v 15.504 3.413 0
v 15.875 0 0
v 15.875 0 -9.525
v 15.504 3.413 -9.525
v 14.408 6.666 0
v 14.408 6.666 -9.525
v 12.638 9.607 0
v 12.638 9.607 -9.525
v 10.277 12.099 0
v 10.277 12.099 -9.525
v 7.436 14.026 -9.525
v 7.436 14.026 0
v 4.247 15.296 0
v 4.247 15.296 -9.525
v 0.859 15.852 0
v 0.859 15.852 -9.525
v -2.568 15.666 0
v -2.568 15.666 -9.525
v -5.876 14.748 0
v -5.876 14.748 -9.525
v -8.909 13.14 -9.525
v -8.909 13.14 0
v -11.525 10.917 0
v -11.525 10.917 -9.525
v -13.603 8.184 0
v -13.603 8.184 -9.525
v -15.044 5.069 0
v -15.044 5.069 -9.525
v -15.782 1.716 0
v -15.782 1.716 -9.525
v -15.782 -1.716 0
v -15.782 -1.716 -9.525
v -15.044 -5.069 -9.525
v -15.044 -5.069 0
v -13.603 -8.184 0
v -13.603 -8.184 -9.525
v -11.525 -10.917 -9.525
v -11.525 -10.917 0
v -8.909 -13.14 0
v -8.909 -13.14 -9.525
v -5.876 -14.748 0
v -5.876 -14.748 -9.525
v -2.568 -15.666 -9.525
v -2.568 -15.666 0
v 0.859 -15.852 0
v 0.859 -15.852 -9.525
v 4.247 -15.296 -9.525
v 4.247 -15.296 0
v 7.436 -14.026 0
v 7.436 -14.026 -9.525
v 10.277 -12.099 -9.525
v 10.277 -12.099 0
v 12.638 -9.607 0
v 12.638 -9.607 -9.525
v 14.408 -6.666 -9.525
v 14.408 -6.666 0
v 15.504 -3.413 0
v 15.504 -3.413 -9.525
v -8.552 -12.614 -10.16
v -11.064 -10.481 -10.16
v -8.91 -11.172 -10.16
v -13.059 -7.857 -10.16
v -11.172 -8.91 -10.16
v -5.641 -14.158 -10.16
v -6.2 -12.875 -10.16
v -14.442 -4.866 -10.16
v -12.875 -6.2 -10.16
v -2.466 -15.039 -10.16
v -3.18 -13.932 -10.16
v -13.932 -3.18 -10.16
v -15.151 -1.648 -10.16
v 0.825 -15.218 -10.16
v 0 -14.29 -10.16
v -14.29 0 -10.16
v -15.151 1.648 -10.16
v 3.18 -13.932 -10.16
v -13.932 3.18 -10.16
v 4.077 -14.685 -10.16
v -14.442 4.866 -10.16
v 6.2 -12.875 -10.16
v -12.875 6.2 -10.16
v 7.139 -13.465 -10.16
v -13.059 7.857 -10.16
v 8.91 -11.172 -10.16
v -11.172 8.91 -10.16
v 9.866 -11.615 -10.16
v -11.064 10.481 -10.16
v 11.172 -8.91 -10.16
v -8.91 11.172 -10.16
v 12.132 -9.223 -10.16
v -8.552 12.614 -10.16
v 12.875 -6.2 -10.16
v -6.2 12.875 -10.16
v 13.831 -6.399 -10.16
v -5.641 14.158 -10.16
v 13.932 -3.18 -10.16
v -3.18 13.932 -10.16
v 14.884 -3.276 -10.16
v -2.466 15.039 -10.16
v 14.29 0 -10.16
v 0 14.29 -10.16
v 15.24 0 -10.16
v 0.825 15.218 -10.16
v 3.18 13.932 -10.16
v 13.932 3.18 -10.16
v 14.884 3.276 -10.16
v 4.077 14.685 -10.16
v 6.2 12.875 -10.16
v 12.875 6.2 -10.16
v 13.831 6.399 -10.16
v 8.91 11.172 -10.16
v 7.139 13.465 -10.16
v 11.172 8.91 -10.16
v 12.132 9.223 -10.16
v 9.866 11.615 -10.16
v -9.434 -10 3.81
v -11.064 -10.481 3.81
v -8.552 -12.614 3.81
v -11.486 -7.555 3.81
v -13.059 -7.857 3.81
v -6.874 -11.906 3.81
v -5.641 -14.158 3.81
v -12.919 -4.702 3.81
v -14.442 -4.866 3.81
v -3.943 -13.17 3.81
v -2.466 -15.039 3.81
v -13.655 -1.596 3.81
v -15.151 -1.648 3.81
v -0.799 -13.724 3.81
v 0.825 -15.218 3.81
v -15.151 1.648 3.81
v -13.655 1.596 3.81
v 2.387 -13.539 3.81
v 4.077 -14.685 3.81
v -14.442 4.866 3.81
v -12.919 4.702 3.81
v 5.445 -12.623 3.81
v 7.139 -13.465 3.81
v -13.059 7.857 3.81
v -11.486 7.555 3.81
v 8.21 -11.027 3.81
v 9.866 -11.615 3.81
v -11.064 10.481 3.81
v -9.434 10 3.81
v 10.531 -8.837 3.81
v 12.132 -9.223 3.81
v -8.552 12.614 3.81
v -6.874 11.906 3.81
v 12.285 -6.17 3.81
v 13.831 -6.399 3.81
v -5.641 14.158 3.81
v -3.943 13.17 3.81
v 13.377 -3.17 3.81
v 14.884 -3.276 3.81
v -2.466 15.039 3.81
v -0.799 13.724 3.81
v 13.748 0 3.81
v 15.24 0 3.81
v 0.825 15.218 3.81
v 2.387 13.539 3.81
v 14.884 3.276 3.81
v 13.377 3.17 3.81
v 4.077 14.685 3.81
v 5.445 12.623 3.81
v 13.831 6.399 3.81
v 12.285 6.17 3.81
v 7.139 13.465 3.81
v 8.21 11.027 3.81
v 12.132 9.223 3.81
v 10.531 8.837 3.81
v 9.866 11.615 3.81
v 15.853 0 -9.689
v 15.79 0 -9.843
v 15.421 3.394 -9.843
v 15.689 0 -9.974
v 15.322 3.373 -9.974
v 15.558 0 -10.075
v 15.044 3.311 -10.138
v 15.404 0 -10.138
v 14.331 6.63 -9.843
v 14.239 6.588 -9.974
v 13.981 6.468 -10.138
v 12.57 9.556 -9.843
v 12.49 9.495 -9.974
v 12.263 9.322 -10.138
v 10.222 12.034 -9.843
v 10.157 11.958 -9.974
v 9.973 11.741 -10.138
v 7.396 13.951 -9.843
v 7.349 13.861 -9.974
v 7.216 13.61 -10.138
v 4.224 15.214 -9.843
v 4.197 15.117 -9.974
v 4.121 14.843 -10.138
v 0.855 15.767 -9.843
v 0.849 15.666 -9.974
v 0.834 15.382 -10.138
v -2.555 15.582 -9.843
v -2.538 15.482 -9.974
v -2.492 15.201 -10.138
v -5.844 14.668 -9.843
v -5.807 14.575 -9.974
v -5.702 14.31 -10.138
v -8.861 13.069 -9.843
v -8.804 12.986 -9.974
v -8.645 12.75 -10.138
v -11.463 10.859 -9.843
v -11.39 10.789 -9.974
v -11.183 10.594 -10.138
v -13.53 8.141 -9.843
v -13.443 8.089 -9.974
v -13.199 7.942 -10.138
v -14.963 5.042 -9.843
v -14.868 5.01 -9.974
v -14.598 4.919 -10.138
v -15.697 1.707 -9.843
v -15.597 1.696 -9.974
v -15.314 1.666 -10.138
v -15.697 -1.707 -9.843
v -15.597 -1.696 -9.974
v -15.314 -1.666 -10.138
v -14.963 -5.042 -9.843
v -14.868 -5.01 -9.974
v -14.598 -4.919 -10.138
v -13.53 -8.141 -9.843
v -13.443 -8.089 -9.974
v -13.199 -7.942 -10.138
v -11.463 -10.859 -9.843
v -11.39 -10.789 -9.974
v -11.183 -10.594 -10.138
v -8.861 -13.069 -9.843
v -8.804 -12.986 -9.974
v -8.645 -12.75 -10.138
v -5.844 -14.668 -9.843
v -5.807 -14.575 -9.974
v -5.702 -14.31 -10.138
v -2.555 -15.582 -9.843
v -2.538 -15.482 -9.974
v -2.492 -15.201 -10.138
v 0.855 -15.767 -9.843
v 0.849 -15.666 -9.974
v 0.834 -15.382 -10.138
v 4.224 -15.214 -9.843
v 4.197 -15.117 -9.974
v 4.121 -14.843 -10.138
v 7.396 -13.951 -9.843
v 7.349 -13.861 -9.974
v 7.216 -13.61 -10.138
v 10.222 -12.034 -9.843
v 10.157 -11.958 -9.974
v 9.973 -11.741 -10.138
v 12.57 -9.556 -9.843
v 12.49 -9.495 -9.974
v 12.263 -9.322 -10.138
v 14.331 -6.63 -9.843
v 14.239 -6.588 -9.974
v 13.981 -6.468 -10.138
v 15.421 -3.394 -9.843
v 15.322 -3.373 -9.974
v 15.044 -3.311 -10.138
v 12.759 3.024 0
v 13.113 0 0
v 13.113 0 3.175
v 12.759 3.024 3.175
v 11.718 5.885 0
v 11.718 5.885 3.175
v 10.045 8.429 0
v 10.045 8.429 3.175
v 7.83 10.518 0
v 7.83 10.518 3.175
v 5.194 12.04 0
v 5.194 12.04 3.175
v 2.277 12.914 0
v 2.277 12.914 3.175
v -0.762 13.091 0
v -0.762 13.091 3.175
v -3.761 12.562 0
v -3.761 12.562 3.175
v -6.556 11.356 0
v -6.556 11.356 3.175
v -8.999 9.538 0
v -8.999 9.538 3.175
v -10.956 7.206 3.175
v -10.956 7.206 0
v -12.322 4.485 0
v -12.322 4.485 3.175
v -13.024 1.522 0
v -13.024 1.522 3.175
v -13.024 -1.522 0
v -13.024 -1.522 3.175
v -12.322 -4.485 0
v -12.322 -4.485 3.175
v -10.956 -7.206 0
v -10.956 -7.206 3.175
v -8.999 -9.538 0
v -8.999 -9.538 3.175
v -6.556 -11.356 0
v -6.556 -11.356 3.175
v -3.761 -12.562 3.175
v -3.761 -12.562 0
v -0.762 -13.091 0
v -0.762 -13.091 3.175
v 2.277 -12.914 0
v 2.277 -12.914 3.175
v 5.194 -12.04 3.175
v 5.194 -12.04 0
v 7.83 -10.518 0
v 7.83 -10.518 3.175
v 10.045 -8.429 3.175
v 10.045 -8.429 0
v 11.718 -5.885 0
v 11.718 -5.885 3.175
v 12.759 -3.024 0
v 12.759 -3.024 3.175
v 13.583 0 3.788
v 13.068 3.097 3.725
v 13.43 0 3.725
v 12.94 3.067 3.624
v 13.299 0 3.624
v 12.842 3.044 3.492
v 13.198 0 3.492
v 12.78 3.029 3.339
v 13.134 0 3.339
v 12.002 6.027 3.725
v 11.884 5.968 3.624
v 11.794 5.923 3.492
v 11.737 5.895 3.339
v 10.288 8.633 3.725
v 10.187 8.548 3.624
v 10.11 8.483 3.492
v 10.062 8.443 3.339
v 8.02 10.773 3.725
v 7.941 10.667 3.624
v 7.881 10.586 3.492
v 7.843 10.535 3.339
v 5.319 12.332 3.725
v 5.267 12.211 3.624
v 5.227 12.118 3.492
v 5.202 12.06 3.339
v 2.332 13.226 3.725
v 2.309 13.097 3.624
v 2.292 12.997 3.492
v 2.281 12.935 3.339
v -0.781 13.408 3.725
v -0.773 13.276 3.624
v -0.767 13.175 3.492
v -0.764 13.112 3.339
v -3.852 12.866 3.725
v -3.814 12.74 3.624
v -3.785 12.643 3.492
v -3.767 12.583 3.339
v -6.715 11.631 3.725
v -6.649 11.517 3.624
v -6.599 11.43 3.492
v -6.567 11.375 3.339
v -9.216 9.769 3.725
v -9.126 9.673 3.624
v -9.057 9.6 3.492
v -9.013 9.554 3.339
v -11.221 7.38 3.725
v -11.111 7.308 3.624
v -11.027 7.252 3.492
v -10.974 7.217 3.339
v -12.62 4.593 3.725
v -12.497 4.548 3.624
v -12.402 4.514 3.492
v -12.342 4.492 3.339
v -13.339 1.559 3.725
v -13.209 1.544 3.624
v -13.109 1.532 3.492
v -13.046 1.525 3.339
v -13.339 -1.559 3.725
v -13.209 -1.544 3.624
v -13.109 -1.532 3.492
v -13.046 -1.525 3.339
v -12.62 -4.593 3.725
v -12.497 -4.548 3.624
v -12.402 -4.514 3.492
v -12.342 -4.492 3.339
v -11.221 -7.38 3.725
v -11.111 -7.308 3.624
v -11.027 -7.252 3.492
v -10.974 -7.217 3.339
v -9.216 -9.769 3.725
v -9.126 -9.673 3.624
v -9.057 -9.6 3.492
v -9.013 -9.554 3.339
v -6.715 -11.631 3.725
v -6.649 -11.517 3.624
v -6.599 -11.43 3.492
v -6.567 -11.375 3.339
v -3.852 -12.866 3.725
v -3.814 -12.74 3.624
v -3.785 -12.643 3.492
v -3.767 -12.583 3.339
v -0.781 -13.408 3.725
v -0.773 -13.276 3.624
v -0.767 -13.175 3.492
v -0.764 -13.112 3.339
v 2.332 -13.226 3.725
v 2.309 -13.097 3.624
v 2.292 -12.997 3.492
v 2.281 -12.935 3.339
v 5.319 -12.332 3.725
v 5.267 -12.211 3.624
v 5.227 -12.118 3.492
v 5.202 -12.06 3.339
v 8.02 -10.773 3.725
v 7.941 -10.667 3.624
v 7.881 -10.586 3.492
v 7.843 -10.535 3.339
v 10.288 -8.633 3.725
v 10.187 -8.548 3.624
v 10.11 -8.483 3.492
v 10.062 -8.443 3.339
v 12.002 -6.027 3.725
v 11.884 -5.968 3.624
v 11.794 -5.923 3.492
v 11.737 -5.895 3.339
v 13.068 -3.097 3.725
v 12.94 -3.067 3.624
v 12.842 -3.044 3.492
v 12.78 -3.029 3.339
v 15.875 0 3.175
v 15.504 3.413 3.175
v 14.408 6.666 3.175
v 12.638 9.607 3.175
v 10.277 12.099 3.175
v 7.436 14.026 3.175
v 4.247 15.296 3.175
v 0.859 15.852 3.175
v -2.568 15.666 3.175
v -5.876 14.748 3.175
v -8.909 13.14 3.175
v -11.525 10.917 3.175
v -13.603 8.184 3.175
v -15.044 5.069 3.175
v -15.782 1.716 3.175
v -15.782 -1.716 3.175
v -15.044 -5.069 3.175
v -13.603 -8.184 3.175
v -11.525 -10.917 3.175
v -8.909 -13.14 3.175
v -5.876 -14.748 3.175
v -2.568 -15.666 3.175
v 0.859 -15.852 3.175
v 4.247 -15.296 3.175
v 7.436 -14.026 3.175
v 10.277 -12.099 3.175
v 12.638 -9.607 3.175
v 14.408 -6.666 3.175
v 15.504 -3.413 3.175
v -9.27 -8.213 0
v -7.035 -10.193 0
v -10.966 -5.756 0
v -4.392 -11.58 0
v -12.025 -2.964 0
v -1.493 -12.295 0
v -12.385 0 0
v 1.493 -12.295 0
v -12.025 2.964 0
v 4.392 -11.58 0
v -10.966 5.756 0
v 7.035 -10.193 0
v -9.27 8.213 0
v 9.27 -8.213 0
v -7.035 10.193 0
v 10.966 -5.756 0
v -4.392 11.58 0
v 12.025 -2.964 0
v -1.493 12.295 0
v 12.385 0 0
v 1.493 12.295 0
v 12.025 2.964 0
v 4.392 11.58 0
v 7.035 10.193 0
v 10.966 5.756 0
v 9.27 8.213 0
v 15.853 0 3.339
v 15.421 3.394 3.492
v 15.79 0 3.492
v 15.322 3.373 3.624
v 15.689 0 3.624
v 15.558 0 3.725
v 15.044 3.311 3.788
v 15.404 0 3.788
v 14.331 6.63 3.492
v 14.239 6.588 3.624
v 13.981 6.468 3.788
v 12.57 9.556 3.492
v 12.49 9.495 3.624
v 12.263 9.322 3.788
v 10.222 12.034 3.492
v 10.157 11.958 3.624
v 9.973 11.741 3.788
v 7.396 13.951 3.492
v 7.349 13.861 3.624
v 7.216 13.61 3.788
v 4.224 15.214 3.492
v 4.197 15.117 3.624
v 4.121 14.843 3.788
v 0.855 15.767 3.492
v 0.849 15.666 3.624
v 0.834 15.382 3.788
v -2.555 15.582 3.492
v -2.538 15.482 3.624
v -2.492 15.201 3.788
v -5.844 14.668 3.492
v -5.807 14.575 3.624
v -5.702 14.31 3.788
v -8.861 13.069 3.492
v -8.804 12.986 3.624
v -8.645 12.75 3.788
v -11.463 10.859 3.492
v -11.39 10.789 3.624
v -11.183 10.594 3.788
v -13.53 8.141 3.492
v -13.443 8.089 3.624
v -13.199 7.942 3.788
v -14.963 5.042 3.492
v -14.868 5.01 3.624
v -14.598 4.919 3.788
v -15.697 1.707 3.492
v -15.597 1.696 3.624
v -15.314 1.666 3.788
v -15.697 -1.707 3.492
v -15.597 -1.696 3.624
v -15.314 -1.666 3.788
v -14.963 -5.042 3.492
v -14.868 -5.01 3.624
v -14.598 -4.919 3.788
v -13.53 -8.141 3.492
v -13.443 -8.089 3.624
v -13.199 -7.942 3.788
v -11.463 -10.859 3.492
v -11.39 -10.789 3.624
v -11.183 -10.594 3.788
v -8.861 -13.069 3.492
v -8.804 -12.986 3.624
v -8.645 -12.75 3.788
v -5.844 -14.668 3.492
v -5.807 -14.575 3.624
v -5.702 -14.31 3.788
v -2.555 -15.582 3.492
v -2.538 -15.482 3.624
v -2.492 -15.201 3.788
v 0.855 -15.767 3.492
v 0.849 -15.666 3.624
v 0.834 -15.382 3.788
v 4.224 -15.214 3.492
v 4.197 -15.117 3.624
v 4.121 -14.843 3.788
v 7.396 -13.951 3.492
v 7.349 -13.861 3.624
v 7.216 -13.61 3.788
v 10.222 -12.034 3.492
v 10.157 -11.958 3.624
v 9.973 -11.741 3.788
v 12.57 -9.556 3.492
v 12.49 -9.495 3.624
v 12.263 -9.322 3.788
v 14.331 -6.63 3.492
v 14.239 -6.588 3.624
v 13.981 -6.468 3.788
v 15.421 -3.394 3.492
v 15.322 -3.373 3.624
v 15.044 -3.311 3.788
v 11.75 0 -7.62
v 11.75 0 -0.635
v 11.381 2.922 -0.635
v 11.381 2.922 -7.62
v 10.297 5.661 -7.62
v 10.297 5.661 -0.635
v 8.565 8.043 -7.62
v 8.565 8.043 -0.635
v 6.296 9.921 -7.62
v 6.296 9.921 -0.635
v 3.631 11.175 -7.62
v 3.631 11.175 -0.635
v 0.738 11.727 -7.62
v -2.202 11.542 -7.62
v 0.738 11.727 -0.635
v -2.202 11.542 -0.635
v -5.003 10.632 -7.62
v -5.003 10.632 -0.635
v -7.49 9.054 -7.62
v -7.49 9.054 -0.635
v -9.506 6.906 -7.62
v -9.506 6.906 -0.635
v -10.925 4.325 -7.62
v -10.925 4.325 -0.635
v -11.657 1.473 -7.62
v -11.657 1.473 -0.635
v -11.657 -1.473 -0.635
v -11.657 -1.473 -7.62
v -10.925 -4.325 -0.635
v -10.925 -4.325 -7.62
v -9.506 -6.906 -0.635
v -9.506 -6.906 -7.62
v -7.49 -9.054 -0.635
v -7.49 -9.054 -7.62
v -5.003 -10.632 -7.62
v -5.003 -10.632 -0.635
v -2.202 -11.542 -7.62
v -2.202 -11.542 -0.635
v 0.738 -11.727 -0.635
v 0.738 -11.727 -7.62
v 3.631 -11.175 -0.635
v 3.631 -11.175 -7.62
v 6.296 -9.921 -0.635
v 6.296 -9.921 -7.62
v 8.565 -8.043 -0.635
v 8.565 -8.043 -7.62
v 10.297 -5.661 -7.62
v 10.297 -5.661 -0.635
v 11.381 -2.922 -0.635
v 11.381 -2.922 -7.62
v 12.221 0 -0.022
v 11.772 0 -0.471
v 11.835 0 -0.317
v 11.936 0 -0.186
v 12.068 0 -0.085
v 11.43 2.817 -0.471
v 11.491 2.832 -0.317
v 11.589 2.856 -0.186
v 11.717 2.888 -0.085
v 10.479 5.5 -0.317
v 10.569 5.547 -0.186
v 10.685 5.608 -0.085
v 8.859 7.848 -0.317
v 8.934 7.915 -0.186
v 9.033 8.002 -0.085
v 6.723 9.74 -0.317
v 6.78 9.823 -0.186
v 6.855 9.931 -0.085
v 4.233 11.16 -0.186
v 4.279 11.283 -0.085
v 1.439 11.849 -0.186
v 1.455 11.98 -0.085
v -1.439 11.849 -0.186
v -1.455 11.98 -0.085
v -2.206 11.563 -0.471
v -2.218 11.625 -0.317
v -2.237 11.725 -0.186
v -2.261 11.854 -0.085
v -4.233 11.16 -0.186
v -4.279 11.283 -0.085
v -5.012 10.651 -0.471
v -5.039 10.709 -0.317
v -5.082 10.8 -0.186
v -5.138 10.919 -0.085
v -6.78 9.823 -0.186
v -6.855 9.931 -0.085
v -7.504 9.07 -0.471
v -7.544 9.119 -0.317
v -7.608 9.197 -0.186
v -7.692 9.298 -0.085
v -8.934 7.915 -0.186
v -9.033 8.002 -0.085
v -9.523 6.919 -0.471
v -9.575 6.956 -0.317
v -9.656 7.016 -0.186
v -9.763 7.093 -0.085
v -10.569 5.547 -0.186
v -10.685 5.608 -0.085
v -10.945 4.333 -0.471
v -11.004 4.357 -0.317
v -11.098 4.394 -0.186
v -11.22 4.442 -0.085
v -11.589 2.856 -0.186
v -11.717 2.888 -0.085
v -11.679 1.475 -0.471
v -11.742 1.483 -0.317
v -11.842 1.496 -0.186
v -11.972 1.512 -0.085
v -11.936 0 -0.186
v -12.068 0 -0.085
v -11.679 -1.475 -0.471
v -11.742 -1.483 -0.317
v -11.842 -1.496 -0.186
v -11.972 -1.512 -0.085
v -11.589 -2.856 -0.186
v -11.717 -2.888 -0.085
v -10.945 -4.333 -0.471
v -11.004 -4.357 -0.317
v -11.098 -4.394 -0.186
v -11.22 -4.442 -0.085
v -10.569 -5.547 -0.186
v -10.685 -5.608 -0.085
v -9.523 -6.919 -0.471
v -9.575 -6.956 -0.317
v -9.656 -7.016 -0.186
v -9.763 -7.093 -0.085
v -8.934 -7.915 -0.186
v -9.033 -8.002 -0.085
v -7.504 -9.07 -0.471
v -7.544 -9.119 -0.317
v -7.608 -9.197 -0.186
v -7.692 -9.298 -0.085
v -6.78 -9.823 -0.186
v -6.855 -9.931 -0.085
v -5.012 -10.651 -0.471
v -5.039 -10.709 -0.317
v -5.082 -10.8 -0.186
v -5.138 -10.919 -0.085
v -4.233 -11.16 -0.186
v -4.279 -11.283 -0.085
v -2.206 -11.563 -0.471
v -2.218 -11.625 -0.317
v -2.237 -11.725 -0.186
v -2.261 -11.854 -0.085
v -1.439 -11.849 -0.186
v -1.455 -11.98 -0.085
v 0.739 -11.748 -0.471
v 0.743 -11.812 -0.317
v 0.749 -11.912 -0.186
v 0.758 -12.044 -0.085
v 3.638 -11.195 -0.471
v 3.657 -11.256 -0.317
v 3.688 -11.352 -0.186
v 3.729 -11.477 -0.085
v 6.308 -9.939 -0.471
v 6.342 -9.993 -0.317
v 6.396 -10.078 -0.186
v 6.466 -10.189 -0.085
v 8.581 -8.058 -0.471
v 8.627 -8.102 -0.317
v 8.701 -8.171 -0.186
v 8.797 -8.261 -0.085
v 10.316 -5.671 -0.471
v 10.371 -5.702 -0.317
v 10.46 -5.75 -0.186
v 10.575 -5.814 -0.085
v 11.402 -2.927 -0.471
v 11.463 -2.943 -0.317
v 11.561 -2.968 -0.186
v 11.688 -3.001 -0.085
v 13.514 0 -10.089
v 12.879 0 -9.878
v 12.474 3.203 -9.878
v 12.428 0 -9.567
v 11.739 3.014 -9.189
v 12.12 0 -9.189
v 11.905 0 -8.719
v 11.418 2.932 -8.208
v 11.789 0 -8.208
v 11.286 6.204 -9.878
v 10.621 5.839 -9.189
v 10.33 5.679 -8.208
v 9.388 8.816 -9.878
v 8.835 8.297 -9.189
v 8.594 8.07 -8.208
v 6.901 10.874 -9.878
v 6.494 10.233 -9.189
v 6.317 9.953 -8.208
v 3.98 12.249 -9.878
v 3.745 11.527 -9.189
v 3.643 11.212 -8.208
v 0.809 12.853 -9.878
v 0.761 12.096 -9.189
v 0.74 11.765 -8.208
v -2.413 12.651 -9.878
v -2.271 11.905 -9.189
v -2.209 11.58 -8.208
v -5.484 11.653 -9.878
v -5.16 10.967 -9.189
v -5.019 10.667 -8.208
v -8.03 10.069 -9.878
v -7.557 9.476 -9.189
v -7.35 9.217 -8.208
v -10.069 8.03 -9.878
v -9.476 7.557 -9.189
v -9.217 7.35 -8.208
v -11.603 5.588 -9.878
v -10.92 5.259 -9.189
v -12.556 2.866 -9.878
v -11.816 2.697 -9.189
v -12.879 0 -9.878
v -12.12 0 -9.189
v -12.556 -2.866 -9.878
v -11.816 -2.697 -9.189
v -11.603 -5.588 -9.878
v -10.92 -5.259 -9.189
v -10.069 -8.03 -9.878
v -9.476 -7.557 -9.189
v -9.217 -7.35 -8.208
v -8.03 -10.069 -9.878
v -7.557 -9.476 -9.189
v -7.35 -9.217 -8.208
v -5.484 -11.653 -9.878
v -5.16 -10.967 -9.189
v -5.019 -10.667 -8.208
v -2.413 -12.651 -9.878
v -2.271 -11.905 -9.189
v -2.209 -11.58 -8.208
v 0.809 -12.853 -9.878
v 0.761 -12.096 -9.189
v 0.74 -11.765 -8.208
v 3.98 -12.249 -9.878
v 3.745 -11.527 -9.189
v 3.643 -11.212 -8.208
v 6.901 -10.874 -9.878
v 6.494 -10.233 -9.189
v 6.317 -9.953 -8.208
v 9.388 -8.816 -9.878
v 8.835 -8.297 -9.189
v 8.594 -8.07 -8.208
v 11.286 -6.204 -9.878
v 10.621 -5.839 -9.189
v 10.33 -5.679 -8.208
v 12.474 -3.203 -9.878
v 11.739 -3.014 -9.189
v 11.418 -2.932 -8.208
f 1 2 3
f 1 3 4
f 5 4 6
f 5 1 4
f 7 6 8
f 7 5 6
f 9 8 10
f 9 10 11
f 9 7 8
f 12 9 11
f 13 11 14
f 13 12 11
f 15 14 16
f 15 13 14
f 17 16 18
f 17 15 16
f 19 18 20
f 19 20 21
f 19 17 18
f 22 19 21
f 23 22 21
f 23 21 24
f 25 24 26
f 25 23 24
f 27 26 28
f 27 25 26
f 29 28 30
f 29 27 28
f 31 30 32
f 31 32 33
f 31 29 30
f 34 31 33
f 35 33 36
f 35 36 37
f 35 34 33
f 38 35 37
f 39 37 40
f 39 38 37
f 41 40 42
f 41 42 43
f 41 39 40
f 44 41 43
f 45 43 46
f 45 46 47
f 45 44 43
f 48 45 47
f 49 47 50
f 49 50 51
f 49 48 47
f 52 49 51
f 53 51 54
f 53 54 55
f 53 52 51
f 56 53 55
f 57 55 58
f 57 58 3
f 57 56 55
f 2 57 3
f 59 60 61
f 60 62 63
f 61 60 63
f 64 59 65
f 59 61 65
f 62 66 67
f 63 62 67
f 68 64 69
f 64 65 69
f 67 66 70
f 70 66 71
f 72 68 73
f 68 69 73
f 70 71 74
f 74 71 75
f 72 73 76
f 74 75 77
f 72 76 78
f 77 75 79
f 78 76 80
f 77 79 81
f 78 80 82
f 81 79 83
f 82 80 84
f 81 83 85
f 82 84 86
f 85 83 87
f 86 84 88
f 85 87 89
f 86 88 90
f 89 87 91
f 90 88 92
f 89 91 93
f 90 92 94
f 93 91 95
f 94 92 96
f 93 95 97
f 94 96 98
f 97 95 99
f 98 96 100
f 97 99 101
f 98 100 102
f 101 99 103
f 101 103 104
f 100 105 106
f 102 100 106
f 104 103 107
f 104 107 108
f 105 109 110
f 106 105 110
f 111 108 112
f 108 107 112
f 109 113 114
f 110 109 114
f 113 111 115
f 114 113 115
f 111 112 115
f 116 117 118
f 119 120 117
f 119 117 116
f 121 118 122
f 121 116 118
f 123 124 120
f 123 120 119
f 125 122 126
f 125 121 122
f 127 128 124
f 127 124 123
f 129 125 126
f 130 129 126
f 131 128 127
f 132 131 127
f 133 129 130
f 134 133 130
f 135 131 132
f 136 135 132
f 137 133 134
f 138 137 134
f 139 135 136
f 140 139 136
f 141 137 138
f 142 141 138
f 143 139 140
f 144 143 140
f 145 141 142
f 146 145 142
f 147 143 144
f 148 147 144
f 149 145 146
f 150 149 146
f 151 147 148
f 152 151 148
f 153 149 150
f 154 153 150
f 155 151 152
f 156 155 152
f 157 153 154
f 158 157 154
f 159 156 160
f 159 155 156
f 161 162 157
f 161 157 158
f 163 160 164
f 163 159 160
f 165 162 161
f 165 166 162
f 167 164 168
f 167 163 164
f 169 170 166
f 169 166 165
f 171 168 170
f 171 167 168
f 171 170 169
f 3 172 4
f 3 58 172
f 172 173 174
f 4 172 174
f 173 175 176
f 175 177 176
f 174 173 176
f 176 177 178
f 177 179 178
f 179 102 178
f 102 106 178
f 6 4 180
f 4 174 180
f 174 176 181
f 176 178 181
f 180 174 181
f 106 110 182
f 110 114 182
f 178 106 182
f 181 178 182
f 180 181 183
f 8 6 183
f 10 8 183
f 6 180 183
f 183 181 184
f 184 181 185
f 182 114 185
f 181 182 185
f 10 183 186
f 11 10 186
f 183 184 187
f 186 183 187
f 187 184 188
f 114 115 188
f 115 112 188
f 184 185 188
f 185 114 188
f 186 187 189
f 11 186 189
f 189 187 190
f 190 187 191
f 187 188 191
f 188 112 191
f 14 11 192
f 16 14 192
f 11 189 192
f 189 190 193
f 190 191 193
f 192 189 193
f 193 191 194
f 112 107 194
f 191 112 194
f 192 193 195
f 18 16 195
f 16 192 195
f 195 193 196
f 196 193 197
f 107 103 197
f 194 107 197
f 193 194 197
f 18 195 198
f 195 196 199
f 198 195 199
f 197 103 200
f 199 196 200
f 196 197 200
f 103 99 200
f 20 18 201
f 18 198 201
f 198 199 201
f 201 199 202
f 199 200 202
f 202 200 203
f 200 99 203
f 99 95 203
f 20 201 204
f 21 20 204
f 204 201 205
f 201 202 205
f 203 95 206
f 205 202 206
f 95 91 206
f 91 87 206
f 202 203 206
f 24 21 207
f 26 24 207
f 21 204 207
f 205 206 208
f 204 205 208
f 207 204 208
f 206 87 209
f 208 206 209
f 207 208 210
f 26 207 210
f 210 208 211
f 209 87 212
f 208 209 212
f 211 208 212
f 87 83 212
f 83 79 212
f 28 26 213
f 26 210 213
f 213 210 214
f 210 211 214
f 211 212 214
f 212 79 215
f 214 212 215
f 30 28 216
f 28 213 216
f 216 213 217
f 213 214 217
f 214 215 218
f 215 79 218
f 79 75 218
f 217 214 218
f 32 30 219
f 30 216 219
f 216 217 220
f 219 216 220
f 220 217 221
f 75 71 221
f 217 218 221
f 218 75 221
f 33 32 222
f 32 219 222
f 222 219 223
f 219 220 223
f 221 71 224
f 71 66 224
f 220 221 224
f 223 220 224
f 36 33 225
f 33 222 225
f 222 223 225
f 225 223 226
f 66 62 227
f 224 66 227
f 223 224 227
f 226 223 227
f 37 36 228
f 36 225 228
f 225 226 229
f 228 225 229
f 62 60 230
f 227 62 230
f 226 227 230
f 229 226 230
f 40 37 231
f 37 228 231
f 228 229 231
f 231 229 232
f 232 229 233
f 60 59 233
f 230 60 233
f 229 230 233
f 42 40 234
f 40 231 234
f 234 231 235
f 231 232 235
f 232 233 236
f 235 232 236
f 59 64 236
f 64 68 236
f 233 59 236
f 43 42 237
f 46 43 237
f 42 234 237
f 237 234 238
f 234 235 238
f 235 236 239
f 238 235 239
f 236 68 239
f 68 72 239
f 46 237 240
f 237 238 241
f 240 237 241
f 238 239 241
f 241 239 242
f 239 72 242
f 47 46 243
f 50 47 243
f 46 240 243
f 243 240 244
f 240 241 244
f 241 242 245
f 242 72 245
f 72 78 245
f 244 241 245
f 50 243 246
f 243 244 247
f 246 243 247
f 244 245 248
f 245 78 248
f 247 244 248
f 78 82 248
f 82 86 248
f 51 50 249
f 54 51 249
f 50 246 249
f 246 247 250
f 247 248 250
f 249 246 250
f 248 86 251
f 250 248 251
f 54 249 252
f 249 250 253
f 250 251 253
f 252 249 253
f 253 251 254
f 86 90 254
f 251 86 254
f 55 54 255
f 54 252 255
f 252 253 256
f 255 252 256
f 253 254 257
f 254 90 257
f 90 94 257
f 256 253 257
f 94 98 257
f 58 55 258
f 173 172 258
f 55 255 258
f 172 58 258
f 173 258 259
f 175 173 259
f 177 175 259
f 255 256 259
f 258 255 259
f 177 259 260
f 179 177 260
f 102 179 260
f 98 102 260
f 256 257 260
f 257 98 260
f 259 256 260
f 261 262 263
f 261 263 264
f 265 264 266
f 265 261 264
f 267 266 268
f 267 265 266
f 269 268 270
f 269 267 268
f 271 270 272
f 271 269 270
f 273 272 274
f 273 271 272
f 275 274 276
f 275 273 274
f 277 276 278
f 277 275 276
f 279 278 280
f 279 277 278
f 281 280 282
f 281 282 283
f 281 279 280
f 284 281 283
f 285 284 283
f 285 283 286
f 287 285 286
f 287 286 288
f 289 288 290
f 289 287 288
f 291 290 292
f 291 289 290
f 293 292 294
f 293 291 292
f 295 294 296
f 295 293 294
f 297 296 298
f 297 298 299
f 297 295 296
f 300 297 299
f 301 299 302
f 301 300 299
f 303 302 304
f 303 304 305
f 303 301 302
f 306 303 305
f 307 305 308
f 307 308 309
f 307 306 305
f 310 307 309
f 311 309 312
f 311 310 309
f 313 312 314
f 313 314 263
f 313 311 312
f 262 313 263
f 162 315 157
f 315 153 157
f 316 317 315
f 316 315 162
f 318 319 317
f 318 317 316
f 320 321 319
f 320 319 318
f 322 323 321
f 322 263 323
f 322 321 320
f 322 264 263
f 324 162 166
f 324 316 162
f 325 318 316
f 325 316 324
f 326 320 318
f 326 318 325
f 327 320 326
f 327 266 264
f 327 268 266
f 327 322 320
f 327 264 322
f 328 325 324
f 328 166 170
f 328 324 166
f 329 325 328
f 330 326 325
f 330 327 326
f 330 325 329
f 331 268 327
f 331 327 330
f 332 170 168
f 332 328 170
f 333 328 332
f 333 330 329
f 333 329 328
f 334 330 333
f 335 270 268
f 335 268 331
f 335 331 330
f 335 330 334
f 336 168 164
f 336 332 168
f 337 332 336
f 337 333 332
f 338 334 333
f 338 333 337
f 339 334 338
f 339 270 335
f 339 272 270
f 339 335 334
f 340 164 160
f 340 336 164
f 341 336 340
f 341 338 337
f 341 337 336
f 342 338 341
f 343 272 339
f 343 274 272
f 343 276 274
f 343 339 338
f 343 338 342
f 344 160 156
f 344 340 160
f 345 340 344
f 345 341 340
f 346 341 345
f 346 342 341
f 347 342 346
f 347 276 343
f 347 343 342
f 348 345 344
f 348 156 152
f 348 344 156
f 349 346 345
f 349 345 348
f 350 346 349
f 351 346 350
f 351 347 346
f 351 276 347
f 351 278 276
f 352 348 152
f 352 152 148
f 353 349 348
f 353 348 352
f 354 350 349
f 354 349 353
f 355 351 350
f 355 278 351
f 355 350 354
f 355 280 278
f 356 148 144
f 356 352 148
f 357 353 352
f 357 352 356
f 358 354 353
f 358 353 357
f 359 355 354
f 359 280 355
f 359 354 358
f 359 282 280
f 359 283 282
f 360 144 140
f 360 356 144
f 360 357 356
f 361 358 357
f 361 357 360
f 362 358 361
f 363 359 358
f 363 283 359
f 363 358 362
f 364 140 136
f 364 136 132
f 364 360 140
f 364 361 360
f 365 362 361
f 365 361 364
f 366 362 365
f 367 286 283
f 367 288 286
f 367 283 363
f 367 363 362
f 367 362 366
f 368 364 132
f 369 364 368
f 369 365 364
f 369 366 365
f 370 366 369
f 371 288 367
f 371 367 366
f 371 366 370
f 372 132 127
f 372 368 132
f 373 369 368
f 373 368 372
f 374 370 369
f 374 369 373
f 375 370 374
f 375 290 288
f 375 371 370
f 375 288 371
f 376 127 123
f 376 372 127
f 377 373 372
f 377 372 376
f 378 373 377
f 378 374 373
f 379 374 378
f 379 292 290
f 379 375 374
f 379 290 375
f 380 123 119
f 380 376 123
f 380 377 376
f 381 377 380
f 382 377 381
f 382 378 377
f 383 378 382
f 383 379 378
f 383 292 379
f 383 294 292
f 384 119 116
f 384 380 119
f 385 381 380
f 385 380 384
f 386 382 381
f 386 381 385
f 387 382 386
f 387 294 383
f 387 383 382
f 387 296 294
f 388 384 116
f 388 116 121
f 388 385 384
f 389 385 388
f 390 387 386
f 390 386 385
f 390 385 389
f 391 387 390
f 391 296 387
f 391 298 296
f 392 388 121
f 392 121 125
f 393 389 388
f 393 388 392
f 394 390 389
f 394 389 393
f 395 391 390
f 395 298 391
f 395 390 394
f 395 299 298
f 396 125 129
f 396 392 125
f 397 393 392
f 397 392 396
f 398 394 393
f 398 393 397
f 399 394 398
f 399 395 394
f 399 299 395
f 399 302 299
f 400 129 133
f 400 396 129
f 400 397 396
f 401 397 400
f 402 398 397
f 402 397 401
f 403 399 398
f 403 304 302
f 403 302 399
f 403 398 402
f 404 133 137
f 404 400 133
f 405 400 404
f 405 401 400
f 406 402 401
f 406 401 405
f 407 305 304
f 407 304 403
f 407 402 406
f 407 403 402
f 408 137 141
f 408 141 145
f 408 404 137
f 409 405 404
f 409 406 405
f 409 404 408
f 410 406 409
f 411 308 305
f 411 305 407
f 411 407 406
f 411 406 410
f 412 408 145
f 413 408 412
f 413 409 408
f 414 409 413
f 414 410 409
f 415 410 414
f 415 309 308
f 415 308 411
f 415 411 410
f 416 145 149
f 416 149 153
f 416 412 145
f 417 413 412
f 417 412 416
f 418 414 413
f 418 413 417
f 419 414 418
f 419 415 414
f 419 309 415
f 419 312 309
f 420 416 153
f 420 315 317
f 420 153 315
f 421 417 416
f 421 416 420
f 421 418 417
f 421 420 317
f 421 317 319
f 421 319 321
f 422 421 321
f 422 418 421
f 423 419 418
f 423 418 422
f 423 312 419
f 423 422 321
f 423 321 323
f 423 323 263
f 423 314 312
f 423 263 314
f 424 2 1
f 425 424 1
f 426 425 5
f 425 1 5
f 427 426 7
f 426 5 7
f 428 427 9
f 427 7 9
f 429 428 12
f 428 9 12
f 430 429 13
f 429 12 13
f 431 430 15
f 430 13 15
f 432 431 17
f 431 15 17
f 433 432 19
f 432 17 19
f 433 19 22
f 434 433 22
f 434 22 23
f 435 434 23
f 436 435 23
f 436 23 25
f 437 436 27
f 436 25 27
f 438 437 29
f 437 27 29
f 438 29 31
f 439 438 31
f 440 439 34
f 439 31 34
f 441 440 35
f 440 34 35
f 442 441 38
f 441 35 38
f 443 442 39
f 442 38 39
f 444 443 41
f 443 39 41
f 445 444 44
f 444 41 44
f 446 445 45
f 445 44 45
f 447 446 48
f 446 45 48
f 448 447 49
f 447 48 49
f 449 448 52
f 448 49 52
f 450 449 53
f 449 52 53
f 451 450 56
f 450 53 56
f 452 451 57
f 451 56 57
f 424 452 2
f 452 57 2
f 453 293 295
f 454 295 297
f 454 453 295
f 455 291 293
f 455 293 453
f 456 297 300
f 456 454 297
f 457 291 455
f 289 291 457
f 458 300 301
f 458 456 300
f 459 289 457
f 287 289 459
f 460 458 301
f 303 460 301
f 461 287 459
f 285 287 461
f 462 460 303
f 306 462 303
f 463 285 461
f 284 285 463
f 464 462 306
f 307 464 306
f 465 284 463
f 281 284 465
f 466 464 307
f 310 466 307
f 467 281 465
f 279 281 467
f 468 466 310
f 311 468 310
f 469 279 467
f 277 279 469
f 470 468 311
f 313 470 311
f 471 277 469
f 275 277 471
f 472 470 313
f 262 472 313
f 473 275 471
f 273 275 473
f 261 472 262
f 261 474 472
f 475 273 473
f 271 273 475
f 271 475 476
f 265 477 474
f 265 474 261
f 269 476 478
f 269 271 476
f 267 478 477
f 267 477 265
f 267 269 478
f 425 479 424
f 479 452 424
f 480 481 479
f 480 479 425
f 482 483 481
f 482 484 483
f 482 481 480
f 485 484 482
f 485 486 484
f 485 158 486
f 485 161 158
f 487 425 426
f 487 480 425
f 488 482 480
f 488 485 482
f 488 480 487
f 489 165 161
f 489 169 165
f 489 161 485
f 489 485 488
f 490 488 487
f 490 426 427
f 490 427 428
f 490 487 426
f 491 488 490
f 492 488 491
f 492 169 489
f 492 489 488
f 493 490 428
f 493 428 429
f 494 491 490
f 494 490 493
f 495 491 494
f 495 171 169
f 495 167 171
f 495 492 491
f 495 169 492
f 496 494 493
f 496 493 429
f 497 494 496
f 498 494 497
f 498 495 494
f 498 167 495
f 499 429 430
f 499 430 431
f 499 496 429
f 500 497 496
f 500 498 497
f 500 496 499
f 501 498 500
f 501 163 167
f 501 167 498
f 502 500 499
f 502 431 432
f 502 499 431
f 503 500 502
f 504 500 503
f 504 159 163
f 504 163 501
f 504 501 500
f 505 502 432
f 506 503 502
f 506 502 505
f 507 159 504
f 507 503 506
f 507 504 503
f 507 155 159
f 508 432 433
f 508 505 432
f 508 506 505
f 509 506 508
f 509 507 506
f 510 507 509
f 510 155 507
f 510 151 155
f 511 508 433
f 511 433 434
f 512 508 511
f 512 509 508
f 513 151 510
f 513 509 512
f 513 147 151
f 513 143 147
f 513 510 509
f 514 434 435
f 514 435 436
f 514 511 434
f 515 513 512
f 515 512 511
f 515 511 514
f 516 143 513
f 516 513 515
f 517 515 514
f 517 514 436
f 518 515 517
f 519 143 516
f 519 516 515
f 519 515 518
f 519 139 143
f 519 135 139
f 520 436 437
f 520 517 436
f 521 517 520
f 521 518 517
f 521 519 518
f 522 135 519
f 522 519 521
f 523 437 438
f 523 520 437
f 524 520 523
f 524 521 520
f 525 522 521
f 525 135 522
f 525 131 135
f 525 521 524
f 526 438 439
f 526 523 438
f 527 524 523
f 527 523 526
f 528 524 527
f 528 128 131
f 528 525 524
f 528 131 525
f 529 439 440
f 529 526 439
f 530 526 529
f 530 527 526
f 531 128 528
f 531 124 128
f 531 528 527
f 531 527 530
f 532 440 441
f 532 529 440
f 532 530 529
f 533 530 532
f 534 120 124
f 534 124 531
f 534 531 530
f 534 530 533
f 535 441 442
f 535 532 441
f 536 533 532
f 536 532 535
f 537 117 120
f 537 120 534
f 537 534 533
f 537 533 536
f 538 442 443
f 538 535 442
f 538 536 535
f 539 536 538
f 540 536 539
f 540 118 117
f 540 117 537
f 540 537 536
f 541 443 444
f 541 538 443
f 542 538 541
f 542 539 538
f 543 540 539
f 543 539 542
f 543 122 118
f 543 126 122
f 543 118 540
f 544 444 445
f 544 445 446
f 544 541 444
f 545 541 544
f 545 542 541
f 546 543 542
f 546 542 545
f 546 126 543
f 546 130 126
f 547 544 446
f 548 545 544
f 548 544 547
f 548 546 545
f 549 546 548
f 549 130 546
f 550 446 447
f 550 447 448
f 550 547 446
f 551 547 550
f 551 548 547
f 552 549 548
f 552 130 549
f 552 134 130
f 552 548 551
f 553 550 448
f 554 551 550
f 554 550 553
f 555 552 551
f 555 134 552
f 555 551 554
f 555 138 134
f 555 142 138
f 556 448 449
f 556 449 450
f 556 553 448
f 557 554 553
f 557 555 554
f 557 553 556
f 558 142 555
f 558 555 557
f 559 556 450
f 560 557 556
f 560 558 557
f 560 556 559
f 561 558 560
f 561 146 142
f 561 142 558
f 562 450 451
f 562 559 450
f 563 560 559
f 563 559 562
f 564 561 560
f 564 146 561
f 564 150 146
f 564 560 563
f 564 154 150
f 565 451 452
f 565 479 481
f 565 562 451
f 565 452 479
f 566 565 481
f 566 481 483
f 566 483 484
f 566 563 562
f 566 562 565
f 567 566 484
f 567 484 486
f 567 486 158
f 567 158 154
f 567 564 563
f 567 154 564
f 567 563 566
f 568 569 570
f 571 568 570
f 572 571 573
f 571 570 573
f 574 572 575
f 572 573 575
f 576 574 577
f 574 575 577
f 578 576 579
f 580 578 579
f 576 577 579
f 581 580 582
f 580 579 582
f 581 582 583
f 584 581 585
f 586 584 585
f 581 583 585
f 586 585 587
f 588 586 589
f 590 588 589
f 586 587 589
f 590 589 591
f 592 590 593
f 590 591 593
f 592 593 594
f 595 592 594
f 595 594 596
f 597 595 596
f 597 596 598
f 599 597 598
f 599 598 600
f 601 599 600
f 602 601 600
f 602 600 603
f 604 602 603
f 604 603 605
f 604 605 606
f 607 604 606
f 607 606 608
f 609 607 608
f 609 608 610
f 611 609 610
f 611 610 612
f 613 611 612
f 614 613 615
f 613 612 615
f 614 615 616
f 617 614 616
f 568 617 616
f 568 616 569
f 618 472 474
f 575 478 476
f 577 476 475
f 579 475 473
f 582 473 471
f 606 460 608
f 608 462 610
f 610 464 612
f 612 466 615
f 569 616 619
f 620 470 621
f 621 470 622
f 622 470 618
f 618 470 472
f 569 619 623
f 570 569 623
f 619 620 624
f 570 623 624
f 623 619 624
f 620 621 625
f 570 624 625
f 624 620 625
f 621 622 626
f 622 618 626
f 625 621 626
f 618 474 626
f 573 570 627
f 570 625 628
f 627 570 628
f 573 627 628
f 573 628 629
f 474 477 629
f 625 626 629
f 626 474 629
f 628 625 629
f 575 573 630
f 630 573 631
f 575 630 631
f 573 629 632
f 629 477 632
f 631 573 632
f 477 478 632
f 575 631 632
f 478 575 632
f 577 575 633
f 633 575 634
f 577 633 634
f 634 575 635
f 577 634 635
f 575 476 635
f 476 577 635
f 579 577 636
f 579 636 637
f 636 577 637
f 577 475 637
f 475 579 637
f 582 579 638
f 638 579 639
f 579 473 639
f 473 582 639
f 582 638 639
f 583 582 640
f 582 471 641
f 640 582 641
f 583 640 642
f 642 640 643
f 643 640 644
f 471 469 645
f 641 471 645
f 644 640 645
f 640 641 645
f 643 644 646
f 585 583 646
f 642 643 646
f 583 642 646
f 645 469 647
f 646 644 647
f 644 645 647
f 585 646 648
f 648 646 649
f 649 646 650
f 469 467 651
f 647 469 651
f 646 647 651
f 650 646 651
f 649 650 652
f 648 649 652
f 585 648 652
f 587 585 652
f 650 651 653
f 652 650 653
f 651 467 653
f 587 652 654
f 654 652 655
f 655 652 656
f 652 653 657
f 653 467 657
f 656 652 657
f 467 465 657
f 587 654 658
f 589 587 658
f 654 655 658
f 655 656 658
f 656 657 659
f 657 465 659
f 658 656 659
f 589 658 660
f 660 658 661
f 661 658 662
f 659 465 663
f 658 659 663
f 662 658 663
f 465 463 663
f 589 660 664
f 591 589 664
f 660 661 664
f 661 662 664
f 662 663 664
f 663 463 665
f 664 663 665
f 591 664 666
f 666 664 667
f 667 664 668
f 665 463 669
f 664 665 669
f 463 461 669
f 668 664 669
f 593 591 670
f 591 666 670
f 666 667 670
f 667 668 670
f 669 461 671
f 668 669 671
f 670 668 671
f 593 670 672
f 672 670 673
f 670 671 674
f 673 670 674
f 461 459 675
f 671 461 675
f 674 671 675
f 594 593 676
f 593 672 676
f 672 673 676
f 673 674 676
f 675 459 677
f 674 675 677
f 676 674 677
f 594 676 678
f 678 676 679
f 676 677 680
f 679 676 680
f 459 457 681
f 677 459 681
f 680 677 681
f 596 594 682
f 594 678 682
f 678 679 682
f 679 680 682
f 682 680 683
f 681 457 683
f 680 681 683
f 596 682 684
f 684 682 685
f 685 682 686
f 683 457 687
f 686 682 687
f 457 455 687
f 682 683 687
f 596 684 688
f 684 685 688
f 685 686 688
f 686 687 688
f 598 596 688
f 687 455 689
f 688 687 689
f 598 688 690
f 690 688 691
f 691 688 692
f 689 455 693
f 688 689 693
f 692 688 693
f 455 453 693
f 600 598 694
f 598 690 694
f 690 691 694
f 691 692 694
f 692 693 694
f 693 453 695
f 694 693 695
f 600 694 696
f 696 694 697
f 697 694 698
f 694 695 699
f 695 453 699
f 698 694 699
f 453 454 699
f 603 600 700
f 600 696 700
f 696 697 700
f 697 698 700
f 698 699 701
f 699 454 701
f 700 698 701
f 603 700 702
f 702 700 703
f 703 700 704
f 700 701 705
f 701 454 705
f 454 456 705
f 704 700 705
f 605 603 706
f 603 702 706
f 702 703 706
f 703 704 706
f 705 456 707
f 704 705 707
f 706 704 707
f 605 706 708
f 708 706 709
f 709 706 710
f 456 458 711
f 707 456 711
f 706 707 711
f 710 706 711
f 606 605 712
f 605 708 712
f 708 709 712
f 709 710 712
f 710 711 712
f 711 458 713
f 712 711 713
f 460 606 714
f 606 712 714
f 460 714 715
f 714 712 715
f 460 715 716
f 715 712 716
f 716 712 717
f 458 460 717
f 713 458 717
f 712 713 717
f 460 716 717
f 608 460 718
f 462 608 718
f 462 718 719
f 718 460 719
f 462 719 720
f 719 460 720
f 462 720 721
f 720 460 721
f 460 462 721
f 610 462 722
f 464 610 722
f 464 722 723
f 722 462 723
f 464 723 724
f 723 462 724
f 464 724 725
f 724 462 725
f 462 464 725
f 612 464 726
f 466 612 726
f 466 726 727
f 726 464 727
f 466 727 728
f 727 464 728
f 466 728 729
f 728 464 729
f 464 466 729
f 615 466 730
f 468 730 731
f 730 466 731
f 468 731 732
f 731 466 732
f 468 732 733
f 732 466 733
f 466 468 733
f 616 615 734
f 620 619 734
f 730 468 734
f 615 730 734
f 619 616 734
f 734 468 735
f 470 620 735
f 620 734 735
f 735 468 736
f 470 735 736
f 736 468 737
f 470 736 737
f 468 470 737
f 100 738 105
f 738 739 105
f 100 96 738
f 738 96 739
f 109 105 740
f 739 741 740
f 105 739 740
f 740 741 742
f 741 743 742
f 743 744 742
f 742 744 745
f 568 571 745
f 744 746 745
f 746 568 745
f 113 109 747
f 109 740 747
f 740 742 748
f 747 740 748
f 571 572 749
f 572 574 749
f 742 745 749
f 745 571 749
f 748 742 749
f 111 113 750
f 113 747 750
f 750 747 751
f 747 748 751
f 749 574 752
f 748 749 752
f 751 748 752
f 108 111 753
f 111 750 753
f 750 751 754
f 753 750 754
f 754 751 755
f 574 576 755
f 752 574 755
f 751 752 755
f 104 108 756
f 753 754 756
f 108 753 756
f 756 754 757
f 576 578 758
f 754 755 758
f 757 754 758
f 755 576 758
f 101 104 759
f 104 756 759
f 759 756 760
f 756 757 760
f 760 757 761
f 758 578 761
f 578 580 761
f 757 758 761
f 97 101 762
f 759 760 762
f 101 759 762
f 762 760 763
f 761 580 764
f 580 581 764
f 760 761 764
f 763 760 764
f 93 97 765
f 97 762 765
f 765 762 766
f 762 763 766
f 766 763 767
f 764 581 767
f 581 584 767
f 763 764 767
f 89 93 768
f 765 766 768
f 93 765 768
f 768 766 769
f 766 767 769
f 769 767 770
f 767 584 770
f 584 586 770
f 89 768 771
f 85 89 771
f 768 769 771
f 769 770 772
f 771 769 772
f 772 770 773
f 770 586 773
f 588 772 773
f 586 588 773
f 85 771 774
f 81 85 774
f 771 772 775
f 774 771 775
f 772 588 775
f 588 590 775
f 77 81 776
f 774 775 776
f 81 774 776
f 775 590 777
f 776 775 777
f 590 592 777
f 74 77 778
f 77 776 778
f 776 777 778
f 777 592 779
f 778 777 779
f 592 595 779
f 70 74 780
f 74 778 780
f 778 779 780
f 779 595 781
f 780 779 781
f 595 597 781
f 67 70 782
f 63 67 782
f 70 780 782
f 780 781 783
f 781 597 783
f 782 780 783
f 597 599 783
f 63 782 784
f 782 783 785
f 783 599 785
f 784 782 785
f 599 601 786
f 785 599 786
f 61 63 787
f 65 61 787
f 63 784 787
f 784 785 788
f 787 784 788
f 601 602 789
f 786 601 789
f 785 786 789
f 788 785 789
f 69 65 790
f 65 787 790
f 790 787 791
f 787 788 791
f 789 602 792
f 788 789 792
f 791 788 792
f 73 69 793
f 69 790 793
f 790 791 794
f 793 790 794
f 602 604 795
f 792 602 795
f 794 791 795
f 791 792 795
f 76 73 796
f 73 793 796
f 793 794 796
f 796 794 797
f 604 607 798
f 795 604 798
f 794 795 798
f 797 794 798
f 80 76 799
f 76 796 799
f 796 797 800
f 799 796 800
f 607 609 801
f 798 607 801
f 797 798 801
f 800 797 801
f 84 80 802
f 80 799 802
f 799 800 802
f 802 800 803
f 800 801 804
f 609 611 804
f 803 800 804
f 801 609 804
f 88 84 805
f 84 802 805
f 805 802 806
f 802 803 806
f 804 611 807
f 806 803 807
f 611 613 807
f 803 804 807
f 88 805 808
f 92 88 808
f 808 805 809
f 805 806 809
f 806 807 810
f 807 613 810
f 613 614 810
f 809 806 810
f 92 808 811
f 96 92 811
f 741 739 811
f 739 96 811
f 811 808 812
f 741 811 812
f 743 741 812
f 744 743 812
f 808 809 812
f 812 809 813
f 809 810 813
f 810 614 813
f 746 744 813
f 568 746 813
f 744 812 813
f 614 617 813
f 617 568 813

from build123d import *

# Parameters (mm, degrees)
F0_R     = 15.875
F0_R_2   = 13.11275
F0_R_3   = 11.75
F1_DEPTH = 10.16
F2_DEPTH = 3.81
F3_R     = 0.635


# Not quite as in the source:
# - a fillet or chamfer that OpenCascade refuses, or shapes differently, is made with other operations: its cross-section is extruded or revolved along the edge and cut away or added


with BuildPart() as f1:
    # F0 (on Top) → F1 (new body)
    with BuildSketch(Plane.XY):
        Circle(F0_R)
        Circle(F0_R_2, mode=Mode.SUBTRACT)
        Circle(F0_R_2)
        Circle(F0_R_3, mode=Mode.SUBTRACT)
    extrude(amount=-F1_DEPTH)

    # F0 (on Top) → F2 (join)
    with BuildSketch(Plane.XY):
        Circle(F0_R)
        Circle(F0_R_2, mode=Mode.SUBTRACT)
    extrude(amount=F2_DEPTH)

    # F3
    f3_edges = [f1.edges().sort_by_distance(p)[0] for p in [
        (-13.11275, 0, 3.81),
        (-15.875, 0, 3.81),
        (-15.875, 0, -10.16),
        (-11.75, 0, 0),
    ]]
    fillet(f3_edges, radius=F3_R)

    # F4: fillet of radius 2.54 on 1 edges, made by hand

    # F4_s1 → F4_t2 (revolve, cut)
    with BuildSketch(Plane.XZ):
        with BuildLine():
            add(Edge.make_bspline(
                [(14.29, -10.16), (11.75, -10.16), (11.75, -7.62)],
                knots=[0, 0, 0, 1, 1, 1], degree=2, weights=[1, 1, 1]))
            Line((11.75, -7.62), (11.75, -10.16))
            Line((11.75, -10.16), (14.29, -10.16))
        make_face()
    revolve(axis=Axis((0, 0, -10.16), (0, 0, 1)), mode=Mode.SUBTRACT)


solid = f1.part
